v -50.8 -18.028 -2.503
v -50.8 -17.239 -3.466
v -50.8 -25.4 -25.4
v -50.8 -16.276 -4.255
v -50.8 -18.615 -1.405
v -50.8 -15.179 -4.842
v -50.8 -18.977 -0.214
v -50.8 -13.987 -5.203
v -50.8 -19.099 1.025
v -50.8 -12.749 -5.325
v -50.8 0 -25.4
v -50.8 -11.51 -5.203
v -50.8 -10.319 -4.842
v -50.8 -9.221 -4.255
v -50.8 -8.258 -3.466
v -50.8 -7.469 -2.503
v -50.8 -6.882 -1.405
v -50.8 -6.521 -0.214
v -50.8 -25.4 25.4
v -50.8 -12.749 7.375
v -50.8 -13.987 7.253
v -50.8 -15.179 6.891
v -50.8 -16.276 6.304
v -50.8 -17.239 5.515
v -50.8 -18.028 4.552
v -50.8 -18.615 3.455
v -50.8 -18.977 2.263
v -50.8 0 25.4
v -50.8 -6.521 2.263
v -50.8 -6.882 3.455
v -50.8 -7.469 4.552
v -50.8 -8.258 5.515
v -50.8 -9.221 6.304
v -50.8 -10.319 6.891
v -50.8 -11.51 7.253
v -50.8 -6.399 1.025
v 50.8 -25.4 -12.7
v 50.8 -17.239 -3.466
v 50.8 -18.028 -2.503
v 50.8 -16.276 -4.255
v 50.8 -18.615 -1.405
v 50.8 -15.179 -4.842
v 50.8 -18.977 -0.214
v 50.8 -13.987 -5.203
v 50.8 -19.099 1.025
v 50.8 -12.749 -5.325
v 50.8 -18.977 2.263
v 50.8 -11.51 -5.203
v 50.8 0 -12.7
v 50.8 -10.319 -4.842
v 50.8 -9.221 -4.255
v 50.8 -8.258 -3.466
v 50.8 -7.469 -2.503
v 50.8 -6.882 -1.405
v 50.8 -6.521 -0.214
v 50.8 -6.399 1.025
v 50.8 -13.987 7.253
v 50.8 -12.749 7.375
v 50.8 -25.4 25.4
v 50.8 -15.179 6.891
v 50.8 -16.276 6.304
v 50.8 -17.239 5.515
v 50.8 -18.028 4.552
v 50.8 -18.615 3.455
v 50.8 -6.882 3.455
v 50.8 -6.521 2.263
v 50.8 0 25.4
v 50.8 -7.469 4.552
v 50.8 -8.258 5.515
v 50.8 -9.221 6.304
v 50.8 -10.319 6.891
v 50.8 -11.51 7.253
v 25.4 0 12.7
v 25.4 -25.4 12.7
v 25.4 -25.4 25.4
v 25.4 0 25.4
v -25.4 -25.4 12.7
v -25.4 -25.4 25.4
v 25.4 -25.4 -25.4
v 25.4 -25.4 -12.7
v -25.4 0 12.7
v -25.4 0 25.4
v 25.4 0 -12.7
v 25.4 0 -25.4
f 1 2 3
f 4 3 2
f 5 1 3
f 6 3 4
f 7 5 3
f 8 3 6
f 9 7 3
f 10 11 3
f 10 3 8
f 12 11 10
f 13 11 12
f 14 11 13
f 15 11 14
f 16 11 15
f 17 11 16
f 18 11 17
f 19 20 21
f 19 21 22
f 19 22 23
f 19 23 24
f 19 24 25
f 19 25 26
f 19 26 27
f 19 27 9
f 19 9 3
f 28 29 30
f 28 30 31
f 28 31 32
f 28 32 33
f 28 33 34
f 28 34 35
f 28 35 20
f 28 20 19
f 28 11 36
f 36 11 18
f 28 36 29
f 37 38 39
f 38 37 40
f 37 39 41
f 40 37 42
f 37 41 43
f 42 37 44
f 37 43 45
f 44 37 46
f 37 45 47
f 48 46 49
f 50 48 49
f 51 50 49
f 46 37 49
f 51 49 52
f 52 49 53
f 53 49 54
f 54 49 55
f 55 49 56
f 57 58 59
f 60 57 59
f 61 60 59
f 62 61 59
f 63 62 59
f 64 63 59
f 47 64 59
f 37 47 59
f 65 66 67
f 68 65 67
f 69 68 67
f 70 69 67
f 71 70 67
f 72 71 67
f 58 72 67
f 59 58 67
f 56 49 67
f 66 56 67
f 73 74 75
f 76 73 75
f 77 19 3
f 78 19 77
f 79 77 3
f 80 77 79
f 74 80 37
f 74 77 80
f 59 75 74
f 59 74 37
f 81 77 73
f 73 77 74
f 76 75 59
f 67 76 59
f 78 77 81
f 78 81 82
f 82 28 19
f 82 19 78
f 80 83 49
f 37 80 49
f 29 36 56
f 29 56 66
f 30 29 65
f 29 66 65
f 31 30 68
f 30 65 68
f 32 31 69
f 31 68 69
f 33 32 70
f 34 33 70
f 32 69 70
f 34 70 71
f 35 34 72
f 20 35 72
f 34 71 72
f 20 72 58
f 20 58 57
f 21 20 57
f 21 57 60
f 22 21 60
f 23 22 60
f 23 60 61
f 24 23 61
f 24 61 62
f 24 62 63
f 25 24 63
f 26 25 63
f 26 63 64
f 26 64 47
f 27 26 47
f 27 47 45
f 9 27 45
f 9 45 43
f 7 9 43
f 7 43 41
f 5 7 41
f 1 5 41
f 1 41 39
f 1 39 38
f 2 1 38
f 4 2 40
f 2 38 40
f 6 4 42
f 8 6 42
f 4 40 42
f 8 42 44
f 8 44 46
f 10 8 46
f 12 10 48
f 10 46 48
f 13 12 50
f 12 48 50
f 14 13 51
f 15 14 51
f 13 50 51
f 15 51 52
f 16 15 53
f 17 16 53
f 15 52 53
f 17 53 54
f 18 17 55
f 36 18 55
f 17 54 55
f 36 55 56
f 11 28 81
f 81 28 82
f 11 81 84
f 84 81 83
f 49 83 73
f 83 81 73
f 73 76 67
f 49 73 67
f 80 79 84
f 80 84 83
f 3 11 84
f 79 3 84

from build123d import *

# Parameters (mm, degrees)
F0_W     = 101.6
F0_H     = 50.8
F1_DEPTH = 25.4
F2_W     = 25.4
F2_H     = 12.7
F3_DEPTH = 25.401
F4_R     = 6.35
F5_DEPTH = 101.601
F6_W     = 50.8
F6_H     = 12.7
F7_DEPTH = 25.401


with BuildPart() as f1:
    # F0 (on Front) → F1 (new body)
    with BuildSketch(Plane.XZ):
        Rectangle(F0_W, F0_H)
    extrude(amount=F1_DEPTH)

    # F2 (on face) → F3 (cut, through all)
    with BuildSketch(Plane.XZ.offset(25.4)):
        with Locations((38.1, -19.05)):
            Rectangle(F2_W, F2_H)
    extrude(amount=-F3_DEPTH, mode=Mode.SUBTRACT)

    # F4 (on face) → F5 (cut, through all)
    with BuildSketch(Plane.YZ.offset(50.8)):
        with Locations((-12.748572, 1.024565)):
            Circle(F4_R)
    extrude(amount=-F5_DEPTH, mode=Mode.SUBTRACT)

    # F6 (on face) → F7 (cut, through all)
    with BuildSketch(Plane.XZ.offset(25.4)):
        with Locations((0, 19.05)):
            Rectangle(F6_W, F6_H)
    extrude(amount=-F7_DEPTH, mode=Mode.SUBTRACT)


solid = f1.part
